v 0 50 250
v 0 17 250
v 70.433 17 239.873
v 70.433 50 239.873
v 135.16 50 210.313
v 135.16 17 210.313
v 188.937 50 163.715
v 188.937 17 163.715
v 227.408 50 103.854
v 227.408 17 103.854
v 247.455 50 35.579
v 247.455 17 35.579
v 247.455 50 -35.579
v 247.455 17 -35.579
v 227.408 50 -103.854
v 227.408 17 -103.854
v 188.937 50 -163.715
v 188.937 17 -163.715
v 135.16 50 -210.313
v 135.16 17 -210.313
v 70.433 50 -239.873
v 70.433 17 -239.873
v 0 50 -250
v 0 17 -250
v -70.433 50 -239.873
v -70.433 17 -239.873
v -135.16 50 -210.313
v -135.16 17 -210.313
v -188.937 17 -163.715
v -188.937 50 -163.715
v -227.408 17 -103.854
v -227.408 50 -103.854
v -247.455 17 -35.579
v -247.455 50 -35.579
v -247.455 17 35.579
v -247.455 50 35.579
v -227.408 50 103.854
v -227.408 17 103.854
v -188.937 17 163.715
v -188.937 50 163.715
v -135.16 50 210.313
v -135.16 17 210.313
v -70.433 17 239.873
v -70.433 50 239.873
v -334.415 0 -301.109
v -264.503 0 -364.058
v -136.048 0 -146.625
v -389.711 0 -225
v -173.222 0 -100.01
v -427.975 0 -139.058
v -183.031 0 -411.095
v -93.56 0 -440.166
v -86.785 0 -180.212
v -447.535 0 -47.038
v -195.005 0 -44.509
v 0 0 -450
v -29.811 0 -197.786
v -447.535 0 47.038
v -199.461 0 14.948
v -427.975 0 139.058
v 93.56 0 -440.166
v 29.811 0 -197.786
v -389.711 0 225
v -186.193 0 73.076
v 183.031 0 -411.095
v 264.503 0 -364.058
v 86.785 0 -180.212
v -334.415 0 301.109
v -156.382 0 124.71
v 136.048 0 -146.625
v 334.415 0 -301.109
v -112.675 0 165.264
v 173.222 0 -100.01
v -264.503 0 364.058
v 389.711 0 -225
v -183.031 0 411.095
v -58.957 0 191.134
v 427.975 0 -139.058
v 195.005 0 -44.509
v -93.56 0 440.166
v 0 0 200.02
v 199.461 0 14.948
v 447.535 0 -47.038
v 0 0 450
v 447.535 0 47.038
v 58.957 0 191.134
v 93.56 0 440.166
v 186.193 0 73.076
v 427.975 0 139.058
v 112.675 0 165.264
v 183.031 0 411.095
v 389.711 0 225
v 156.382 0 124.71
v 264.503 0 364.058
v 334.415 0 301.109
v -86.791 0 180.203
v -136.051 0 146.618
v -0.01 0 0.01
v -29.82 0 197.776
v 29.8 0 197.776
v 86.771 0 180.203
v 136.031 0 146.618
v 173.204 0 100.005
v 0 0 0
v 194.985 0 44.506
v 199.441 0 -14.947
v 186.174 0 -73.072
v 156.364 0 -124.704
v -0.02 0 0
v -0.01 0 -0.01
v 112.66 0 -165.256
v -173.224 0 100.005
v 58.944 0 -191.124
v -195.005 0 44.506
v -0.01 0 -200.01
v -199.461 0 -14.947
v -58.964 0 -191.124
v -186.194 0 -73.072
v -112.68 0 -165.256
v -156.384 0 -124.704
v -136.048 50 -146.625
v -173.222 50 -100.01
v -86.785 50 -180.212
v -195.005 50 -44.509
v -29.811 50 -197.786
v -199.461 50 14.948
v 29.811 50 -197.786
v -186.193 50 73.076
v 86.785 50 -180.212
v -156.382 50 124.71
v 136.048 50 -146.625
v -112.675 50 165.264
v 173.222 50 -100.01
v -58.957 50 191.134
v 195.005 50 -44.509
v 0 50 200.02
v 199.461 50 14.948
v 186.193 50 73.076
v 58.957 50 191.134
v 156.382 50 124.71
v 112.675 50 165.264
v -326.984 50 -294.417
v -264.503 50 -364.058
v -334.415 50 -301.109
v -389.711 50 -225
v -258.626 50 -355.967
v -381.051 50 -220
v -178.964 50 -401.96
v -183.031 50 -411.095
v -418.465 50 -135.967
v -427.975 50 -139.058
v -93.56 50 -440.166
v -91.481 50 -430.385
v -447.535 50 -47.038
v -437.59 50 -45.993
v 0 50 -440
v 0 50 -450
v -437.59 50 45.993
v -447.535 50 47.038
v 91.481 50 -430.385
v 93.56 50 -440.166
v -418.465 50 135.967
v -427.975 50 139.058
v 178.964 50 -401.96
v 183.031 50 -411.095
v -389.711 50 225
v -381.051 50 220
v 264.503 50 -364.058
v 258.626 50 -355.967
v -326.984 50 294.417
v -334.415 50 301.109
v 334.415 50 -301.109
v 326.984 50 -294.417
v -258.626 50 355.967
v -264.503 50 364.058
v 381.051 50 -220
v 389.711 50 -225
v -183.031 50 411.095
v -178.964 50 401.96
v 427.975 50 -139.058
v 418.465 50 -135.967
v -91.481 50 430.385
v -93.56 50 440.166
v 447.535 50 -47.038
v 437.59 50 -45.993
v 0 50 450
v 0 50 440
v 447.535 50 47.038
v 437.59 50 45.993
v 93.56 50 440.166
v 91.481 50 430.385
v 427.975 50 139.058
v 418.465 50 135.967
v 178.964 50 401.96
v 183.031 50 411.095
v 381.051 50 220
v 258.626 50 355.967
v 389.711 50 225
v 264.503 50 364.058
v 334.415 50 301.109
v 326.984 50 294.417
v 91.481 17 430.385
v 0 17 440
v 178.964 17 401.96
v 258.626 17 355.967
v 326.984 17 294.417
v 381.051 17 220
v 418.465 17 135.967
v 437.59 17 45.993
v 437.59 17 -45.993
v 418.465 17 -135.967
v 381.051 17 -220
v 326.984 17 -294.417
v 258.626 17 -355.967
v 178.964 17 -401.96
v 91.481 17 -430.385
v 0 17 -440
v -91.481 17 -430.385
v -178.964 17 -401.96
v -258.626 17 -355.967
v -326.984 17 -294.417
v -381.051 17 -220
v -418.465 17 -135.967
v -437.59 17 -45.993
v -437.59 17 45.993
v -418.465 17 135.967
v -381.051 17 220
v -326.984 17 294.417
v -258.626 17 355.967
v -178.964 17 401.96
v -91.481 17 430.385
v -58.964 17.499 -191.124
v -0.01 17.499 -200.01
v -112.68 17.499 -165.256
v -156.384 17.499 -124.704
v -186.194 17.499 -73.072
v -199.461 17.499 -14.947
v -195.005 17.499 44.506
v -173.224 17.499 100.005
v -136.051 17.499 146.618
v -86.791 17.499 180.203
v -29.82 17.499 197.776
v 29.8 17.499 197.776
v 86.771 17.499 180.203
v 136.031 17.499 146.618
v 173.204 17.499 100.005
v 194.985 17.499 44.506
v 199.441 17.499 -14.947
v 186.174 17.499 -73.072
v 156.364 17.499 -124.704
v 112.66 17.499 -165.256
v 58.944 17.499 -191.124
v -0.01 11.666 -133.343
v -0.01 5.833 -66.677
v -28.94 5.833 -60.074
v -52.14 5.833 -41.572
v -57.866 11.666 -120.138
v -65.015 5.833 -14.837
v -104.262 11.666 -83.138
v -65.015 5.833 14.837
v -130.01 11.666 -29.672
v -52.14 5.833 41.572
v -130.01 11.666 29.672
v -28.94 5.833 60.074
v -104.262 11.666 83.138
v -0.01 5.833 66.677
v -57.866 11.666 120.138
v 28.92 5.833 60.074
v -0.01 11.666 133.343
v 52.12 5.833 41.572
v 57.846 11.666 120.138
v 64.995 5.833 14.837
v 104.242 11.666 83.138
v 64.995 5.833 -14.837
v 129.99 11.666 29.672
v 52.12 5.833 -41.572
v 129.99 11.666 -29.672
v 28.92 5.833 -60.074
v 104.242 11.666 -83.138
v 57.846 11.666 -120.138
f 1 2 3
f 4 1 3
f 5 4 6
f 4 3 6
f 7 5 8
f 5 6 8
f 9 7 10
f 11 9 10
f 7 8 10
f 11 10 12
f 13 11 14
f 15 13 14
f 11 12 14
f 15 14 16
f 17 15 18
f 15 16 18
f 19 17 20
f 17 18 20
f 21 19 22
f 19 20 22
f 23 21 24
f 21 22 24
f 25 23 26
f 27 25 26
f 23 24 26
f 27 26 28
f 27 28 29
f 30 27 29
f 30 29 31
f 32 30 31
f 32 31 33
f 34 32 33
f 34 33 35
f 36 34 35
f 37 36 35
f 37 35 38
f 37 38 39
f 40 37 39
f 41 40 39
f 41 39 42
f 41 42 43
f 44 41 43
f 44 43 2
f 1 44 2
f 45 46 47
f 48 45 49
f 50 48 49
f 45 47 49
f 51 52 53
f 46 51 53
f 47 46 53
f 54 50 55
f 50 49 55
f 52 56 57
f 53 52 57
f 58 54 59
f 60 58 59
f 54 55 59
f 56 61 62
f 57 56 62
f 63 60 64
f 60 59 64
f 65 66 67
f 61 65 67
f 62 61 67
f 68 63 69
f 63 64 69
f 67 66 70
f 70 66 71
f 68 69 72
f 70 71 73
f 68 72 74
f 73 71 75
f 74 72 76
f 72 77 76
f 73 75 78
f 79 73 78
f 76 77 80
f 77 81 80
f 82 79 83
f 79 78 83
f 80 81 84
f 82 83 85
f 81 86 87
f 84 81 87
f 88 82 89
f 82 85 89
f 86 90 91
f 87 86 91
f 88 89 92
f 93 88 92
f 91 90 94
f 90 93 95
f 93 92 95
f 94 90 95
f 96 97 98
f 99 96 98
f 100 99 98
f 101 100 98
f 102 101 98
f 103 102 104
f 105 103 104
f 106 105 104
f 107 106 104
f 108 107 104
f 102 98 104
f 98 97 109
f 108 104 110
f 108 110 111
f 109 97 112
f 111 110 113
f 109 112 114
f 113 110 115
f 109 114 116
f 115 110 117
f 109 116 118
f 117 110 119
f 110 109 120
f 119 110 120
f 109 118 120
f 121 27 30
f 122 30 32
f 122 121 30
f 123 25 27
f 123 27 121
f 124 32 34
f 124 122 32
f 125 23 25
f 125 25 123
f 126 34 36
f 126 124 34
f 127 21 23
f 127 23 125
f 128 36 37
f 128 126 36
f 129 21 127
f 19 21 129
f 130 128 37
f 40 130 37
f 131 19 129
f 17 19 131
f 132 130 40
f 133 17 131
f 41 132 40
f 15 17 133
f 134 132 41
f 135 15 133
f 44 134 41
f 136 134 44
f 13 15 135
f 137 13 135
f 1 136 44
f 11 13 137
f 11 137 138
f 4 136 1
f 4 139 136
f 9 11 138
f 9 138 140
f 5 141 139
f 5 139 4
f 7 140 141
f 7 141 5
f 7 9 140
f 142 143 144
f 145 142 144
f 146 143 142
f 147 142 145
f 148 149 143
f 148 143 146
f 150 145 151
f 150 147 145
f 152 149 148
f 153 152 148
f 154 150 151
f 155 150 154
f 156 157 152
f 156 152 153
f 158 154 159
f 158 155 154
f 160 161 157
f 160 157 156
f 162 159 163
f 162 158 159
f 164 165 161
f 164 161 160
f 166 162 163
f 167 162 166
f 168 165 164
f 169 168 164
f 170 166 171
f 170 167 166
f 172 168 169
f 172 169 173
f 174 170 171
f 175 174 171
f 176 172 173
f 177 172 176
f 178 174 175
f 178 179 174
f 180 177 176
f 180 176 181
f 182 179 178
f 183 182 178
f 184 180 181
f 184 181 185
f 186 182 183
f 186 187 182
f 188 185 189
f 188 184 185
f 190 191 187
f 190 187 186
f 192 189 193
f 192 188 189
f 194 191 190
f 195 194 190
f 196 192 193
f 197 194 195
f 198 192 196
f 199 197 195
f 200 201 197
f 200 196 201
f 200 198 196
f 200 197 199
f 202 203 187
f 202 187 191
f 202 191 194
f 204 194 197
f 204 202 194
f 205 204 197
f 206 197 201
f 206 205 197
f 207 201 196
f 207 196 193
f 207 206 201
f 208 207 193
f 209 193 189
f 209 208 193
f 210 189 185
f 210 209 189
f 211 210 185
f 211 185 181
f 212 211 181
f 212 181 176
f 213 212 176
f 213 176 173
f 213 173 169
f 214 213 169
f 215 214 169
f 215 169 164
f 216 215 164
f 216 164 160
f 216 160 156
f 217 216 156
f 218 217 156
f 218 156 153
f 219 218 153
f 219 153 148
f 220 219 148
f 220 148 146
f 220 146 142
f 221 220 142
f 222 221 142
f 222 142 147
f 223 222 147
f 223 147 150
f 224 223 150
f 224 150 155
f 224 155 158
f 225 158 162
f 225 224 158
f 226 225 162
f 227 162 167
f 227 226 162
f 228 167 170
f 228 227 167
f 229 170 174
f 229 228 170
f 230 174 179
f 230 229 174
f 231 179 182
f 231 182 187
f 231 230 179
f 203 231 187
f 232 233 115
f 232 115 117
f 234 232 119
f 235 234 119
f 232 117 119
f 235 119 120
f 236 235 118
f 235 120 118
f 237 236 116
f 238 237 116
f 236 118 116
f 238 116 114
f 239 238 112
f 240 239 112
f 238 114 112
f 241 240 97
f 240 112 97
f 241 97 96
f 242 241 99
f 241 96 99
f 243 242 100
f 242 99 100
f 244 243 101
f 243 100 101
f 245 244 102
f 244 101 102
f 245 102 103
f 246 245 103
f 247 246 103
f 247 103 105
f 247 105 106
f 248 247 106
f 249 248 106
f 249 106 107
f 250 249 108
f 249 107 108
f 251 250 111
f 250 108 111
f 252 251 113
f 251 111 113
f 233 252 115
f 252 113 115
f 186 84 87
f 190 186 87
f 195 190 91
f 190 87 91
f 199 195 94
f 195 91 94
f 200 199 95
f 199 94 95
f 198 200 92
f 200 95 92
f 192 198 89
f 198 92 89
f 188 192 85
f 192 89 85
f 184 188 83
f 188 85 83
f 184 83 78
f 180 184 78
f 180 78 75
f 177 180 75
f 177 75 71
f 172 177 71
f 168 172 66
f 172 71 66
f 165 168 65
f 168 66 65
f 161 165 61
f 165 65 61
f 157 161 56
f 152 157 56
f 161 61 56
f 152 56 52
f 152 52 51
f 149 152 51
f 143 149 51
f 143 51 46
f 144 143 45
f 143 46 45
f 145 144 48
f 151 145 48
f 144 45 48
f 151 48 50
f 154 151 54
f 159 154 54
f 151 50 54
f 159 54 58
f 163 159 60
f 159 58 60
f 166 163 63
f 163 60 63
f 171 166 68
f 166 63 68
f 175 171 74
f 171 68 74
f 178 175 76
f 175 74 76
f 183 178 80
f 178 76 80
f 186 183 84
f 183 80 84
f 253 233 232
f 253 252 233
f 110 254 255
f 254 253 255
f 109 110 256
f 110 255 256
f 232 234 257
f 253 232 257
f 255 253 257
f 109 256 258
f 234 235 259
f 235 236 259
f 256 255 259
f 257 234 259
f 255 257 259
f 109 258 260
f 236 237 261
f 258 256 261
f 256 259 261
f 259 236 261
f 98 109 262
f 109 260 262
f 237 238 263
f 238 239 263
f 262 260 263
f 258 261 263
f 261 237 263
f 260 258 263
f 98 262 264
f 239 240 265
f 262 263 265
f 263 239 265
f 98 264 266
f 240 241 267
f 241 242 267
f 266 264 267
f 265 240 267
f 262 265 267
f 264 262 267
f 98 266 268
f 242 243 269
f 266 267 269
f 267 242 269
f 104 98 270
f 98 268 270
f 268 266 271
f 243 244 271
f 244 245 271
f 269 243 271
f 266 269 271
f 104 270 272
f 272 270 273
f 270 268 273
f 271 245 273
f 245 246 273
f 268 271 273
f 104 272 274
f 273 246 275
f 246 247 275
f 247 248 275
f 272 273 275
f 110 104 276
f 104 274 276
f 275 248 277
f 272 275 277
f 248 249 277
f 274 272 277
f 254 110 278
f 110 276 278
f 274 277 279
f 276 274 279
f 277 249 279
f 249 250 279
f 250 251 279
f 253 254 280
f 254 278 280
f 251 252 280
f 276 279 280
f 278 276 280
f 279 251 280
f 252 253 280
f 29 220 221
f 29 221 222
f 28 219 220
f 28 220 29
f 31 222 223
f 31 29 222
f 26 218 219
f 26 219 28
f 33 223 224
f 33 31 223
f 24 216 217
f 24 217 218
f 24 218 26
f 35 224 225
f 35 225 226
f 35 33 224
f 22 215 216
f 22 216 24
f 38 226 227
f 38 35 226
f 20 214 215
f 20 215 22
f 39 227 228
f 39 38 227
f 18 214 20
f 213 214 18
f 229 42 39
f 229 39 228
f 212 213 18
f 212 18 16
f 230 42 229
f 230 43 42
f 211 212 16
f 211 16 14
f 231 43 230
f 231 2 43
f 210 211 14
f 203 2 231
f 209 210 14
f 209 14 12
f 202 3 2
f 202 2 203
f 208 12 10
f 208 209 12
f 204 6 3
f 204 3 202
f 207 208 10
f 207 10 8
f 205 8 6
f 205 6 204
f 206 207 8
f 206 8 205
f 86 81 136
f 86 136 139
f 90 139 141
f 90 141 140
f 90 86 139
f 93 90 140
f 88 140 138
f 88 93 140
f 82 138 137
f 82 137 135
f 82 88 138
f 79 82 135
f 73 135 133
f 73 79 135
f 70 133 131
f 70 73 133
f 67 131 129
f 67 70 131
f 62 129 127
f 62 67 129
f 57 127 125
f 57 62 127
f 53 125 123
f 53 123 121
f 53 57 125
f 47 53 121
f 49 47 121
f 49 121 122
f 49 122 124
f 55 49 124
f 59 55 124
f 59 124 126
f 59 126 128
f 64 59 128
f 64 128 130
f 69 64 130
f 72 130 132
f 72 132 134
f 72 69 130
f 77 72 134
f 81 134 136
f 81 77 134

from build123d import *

# Parameters (mm, degrees)
SKETCH_8_R        = 250
SKETCH_8_R_2      = 200.02
EXTRUDE_1_DEPTH   = 50
SKETCH_8_R_3      = 450
SKETCH_8_R_4      = 440
EXTRUDE_1_2_DEPTH = 50
SKETCH_8_3_R      = 440
SKETCH_8_3_R_2    = 250
EXTRUDE_2_DEPTH   = 17


with BuildPart() as part:
    # 草图1 → 旋转1 (revolve)
    with BuildSketch(Plane.XY):
        Polygon((0, 0), (200, 17.49923176), (200, 0), align=None)
    revolve(axis=Axis((-0.01, 0, 0), (0, 1, 0)))


with BuildPart() as body_2:
    # 草图8 → 凸台-拉伸1 (new body)
    with BuildSketch(Plane(origin=(0, 0, 0), x_dir=(1, 0, 0), z_dir=(0, 1, 0))):
        Circle(SKETCH_8_R)
        Circle(SKETCH_8_R_2, mode=Mode.SUBTRACT)
    extrude(amount=EXTRUDE_1_DEPTH)



with BuildPart() as body_3:
    # 草图8 → Extrude 1 2 (new body)
    with BuildSketch(Plane(origin=(0, 0, 0), x_dir=(1, 0, 0), z_dir=(0, 1, 0))):
        Circle(SKETCH_8_R_3)
        Circle(SKETCH_8_R_4, mode=Mode.SUBTRACT)
    extrude(amount=EXTRUDE_1_2_DEPTH)


with BuildPart() as body_2_1:
    add(body_2.part)

    add(body_3.part)  # 凸台-拉伸2 merges body 3
    # 草图8<3> → 凸台-拉伸2 (add)
    with BuildSketch(Plane(origin=(0, 0, 0), x_dir=(1, 0, 0), z_dir=(0, 1, 0))):
        Circle(SKETCH_8_3_R)
        Circle(SKETCH_8_3_R_2, mode=Mode.SUBTRACT)
    extrude(amount=EXTRUDE_2_DEPTH)


solid = Compound([part.part, body_2_1.part])
